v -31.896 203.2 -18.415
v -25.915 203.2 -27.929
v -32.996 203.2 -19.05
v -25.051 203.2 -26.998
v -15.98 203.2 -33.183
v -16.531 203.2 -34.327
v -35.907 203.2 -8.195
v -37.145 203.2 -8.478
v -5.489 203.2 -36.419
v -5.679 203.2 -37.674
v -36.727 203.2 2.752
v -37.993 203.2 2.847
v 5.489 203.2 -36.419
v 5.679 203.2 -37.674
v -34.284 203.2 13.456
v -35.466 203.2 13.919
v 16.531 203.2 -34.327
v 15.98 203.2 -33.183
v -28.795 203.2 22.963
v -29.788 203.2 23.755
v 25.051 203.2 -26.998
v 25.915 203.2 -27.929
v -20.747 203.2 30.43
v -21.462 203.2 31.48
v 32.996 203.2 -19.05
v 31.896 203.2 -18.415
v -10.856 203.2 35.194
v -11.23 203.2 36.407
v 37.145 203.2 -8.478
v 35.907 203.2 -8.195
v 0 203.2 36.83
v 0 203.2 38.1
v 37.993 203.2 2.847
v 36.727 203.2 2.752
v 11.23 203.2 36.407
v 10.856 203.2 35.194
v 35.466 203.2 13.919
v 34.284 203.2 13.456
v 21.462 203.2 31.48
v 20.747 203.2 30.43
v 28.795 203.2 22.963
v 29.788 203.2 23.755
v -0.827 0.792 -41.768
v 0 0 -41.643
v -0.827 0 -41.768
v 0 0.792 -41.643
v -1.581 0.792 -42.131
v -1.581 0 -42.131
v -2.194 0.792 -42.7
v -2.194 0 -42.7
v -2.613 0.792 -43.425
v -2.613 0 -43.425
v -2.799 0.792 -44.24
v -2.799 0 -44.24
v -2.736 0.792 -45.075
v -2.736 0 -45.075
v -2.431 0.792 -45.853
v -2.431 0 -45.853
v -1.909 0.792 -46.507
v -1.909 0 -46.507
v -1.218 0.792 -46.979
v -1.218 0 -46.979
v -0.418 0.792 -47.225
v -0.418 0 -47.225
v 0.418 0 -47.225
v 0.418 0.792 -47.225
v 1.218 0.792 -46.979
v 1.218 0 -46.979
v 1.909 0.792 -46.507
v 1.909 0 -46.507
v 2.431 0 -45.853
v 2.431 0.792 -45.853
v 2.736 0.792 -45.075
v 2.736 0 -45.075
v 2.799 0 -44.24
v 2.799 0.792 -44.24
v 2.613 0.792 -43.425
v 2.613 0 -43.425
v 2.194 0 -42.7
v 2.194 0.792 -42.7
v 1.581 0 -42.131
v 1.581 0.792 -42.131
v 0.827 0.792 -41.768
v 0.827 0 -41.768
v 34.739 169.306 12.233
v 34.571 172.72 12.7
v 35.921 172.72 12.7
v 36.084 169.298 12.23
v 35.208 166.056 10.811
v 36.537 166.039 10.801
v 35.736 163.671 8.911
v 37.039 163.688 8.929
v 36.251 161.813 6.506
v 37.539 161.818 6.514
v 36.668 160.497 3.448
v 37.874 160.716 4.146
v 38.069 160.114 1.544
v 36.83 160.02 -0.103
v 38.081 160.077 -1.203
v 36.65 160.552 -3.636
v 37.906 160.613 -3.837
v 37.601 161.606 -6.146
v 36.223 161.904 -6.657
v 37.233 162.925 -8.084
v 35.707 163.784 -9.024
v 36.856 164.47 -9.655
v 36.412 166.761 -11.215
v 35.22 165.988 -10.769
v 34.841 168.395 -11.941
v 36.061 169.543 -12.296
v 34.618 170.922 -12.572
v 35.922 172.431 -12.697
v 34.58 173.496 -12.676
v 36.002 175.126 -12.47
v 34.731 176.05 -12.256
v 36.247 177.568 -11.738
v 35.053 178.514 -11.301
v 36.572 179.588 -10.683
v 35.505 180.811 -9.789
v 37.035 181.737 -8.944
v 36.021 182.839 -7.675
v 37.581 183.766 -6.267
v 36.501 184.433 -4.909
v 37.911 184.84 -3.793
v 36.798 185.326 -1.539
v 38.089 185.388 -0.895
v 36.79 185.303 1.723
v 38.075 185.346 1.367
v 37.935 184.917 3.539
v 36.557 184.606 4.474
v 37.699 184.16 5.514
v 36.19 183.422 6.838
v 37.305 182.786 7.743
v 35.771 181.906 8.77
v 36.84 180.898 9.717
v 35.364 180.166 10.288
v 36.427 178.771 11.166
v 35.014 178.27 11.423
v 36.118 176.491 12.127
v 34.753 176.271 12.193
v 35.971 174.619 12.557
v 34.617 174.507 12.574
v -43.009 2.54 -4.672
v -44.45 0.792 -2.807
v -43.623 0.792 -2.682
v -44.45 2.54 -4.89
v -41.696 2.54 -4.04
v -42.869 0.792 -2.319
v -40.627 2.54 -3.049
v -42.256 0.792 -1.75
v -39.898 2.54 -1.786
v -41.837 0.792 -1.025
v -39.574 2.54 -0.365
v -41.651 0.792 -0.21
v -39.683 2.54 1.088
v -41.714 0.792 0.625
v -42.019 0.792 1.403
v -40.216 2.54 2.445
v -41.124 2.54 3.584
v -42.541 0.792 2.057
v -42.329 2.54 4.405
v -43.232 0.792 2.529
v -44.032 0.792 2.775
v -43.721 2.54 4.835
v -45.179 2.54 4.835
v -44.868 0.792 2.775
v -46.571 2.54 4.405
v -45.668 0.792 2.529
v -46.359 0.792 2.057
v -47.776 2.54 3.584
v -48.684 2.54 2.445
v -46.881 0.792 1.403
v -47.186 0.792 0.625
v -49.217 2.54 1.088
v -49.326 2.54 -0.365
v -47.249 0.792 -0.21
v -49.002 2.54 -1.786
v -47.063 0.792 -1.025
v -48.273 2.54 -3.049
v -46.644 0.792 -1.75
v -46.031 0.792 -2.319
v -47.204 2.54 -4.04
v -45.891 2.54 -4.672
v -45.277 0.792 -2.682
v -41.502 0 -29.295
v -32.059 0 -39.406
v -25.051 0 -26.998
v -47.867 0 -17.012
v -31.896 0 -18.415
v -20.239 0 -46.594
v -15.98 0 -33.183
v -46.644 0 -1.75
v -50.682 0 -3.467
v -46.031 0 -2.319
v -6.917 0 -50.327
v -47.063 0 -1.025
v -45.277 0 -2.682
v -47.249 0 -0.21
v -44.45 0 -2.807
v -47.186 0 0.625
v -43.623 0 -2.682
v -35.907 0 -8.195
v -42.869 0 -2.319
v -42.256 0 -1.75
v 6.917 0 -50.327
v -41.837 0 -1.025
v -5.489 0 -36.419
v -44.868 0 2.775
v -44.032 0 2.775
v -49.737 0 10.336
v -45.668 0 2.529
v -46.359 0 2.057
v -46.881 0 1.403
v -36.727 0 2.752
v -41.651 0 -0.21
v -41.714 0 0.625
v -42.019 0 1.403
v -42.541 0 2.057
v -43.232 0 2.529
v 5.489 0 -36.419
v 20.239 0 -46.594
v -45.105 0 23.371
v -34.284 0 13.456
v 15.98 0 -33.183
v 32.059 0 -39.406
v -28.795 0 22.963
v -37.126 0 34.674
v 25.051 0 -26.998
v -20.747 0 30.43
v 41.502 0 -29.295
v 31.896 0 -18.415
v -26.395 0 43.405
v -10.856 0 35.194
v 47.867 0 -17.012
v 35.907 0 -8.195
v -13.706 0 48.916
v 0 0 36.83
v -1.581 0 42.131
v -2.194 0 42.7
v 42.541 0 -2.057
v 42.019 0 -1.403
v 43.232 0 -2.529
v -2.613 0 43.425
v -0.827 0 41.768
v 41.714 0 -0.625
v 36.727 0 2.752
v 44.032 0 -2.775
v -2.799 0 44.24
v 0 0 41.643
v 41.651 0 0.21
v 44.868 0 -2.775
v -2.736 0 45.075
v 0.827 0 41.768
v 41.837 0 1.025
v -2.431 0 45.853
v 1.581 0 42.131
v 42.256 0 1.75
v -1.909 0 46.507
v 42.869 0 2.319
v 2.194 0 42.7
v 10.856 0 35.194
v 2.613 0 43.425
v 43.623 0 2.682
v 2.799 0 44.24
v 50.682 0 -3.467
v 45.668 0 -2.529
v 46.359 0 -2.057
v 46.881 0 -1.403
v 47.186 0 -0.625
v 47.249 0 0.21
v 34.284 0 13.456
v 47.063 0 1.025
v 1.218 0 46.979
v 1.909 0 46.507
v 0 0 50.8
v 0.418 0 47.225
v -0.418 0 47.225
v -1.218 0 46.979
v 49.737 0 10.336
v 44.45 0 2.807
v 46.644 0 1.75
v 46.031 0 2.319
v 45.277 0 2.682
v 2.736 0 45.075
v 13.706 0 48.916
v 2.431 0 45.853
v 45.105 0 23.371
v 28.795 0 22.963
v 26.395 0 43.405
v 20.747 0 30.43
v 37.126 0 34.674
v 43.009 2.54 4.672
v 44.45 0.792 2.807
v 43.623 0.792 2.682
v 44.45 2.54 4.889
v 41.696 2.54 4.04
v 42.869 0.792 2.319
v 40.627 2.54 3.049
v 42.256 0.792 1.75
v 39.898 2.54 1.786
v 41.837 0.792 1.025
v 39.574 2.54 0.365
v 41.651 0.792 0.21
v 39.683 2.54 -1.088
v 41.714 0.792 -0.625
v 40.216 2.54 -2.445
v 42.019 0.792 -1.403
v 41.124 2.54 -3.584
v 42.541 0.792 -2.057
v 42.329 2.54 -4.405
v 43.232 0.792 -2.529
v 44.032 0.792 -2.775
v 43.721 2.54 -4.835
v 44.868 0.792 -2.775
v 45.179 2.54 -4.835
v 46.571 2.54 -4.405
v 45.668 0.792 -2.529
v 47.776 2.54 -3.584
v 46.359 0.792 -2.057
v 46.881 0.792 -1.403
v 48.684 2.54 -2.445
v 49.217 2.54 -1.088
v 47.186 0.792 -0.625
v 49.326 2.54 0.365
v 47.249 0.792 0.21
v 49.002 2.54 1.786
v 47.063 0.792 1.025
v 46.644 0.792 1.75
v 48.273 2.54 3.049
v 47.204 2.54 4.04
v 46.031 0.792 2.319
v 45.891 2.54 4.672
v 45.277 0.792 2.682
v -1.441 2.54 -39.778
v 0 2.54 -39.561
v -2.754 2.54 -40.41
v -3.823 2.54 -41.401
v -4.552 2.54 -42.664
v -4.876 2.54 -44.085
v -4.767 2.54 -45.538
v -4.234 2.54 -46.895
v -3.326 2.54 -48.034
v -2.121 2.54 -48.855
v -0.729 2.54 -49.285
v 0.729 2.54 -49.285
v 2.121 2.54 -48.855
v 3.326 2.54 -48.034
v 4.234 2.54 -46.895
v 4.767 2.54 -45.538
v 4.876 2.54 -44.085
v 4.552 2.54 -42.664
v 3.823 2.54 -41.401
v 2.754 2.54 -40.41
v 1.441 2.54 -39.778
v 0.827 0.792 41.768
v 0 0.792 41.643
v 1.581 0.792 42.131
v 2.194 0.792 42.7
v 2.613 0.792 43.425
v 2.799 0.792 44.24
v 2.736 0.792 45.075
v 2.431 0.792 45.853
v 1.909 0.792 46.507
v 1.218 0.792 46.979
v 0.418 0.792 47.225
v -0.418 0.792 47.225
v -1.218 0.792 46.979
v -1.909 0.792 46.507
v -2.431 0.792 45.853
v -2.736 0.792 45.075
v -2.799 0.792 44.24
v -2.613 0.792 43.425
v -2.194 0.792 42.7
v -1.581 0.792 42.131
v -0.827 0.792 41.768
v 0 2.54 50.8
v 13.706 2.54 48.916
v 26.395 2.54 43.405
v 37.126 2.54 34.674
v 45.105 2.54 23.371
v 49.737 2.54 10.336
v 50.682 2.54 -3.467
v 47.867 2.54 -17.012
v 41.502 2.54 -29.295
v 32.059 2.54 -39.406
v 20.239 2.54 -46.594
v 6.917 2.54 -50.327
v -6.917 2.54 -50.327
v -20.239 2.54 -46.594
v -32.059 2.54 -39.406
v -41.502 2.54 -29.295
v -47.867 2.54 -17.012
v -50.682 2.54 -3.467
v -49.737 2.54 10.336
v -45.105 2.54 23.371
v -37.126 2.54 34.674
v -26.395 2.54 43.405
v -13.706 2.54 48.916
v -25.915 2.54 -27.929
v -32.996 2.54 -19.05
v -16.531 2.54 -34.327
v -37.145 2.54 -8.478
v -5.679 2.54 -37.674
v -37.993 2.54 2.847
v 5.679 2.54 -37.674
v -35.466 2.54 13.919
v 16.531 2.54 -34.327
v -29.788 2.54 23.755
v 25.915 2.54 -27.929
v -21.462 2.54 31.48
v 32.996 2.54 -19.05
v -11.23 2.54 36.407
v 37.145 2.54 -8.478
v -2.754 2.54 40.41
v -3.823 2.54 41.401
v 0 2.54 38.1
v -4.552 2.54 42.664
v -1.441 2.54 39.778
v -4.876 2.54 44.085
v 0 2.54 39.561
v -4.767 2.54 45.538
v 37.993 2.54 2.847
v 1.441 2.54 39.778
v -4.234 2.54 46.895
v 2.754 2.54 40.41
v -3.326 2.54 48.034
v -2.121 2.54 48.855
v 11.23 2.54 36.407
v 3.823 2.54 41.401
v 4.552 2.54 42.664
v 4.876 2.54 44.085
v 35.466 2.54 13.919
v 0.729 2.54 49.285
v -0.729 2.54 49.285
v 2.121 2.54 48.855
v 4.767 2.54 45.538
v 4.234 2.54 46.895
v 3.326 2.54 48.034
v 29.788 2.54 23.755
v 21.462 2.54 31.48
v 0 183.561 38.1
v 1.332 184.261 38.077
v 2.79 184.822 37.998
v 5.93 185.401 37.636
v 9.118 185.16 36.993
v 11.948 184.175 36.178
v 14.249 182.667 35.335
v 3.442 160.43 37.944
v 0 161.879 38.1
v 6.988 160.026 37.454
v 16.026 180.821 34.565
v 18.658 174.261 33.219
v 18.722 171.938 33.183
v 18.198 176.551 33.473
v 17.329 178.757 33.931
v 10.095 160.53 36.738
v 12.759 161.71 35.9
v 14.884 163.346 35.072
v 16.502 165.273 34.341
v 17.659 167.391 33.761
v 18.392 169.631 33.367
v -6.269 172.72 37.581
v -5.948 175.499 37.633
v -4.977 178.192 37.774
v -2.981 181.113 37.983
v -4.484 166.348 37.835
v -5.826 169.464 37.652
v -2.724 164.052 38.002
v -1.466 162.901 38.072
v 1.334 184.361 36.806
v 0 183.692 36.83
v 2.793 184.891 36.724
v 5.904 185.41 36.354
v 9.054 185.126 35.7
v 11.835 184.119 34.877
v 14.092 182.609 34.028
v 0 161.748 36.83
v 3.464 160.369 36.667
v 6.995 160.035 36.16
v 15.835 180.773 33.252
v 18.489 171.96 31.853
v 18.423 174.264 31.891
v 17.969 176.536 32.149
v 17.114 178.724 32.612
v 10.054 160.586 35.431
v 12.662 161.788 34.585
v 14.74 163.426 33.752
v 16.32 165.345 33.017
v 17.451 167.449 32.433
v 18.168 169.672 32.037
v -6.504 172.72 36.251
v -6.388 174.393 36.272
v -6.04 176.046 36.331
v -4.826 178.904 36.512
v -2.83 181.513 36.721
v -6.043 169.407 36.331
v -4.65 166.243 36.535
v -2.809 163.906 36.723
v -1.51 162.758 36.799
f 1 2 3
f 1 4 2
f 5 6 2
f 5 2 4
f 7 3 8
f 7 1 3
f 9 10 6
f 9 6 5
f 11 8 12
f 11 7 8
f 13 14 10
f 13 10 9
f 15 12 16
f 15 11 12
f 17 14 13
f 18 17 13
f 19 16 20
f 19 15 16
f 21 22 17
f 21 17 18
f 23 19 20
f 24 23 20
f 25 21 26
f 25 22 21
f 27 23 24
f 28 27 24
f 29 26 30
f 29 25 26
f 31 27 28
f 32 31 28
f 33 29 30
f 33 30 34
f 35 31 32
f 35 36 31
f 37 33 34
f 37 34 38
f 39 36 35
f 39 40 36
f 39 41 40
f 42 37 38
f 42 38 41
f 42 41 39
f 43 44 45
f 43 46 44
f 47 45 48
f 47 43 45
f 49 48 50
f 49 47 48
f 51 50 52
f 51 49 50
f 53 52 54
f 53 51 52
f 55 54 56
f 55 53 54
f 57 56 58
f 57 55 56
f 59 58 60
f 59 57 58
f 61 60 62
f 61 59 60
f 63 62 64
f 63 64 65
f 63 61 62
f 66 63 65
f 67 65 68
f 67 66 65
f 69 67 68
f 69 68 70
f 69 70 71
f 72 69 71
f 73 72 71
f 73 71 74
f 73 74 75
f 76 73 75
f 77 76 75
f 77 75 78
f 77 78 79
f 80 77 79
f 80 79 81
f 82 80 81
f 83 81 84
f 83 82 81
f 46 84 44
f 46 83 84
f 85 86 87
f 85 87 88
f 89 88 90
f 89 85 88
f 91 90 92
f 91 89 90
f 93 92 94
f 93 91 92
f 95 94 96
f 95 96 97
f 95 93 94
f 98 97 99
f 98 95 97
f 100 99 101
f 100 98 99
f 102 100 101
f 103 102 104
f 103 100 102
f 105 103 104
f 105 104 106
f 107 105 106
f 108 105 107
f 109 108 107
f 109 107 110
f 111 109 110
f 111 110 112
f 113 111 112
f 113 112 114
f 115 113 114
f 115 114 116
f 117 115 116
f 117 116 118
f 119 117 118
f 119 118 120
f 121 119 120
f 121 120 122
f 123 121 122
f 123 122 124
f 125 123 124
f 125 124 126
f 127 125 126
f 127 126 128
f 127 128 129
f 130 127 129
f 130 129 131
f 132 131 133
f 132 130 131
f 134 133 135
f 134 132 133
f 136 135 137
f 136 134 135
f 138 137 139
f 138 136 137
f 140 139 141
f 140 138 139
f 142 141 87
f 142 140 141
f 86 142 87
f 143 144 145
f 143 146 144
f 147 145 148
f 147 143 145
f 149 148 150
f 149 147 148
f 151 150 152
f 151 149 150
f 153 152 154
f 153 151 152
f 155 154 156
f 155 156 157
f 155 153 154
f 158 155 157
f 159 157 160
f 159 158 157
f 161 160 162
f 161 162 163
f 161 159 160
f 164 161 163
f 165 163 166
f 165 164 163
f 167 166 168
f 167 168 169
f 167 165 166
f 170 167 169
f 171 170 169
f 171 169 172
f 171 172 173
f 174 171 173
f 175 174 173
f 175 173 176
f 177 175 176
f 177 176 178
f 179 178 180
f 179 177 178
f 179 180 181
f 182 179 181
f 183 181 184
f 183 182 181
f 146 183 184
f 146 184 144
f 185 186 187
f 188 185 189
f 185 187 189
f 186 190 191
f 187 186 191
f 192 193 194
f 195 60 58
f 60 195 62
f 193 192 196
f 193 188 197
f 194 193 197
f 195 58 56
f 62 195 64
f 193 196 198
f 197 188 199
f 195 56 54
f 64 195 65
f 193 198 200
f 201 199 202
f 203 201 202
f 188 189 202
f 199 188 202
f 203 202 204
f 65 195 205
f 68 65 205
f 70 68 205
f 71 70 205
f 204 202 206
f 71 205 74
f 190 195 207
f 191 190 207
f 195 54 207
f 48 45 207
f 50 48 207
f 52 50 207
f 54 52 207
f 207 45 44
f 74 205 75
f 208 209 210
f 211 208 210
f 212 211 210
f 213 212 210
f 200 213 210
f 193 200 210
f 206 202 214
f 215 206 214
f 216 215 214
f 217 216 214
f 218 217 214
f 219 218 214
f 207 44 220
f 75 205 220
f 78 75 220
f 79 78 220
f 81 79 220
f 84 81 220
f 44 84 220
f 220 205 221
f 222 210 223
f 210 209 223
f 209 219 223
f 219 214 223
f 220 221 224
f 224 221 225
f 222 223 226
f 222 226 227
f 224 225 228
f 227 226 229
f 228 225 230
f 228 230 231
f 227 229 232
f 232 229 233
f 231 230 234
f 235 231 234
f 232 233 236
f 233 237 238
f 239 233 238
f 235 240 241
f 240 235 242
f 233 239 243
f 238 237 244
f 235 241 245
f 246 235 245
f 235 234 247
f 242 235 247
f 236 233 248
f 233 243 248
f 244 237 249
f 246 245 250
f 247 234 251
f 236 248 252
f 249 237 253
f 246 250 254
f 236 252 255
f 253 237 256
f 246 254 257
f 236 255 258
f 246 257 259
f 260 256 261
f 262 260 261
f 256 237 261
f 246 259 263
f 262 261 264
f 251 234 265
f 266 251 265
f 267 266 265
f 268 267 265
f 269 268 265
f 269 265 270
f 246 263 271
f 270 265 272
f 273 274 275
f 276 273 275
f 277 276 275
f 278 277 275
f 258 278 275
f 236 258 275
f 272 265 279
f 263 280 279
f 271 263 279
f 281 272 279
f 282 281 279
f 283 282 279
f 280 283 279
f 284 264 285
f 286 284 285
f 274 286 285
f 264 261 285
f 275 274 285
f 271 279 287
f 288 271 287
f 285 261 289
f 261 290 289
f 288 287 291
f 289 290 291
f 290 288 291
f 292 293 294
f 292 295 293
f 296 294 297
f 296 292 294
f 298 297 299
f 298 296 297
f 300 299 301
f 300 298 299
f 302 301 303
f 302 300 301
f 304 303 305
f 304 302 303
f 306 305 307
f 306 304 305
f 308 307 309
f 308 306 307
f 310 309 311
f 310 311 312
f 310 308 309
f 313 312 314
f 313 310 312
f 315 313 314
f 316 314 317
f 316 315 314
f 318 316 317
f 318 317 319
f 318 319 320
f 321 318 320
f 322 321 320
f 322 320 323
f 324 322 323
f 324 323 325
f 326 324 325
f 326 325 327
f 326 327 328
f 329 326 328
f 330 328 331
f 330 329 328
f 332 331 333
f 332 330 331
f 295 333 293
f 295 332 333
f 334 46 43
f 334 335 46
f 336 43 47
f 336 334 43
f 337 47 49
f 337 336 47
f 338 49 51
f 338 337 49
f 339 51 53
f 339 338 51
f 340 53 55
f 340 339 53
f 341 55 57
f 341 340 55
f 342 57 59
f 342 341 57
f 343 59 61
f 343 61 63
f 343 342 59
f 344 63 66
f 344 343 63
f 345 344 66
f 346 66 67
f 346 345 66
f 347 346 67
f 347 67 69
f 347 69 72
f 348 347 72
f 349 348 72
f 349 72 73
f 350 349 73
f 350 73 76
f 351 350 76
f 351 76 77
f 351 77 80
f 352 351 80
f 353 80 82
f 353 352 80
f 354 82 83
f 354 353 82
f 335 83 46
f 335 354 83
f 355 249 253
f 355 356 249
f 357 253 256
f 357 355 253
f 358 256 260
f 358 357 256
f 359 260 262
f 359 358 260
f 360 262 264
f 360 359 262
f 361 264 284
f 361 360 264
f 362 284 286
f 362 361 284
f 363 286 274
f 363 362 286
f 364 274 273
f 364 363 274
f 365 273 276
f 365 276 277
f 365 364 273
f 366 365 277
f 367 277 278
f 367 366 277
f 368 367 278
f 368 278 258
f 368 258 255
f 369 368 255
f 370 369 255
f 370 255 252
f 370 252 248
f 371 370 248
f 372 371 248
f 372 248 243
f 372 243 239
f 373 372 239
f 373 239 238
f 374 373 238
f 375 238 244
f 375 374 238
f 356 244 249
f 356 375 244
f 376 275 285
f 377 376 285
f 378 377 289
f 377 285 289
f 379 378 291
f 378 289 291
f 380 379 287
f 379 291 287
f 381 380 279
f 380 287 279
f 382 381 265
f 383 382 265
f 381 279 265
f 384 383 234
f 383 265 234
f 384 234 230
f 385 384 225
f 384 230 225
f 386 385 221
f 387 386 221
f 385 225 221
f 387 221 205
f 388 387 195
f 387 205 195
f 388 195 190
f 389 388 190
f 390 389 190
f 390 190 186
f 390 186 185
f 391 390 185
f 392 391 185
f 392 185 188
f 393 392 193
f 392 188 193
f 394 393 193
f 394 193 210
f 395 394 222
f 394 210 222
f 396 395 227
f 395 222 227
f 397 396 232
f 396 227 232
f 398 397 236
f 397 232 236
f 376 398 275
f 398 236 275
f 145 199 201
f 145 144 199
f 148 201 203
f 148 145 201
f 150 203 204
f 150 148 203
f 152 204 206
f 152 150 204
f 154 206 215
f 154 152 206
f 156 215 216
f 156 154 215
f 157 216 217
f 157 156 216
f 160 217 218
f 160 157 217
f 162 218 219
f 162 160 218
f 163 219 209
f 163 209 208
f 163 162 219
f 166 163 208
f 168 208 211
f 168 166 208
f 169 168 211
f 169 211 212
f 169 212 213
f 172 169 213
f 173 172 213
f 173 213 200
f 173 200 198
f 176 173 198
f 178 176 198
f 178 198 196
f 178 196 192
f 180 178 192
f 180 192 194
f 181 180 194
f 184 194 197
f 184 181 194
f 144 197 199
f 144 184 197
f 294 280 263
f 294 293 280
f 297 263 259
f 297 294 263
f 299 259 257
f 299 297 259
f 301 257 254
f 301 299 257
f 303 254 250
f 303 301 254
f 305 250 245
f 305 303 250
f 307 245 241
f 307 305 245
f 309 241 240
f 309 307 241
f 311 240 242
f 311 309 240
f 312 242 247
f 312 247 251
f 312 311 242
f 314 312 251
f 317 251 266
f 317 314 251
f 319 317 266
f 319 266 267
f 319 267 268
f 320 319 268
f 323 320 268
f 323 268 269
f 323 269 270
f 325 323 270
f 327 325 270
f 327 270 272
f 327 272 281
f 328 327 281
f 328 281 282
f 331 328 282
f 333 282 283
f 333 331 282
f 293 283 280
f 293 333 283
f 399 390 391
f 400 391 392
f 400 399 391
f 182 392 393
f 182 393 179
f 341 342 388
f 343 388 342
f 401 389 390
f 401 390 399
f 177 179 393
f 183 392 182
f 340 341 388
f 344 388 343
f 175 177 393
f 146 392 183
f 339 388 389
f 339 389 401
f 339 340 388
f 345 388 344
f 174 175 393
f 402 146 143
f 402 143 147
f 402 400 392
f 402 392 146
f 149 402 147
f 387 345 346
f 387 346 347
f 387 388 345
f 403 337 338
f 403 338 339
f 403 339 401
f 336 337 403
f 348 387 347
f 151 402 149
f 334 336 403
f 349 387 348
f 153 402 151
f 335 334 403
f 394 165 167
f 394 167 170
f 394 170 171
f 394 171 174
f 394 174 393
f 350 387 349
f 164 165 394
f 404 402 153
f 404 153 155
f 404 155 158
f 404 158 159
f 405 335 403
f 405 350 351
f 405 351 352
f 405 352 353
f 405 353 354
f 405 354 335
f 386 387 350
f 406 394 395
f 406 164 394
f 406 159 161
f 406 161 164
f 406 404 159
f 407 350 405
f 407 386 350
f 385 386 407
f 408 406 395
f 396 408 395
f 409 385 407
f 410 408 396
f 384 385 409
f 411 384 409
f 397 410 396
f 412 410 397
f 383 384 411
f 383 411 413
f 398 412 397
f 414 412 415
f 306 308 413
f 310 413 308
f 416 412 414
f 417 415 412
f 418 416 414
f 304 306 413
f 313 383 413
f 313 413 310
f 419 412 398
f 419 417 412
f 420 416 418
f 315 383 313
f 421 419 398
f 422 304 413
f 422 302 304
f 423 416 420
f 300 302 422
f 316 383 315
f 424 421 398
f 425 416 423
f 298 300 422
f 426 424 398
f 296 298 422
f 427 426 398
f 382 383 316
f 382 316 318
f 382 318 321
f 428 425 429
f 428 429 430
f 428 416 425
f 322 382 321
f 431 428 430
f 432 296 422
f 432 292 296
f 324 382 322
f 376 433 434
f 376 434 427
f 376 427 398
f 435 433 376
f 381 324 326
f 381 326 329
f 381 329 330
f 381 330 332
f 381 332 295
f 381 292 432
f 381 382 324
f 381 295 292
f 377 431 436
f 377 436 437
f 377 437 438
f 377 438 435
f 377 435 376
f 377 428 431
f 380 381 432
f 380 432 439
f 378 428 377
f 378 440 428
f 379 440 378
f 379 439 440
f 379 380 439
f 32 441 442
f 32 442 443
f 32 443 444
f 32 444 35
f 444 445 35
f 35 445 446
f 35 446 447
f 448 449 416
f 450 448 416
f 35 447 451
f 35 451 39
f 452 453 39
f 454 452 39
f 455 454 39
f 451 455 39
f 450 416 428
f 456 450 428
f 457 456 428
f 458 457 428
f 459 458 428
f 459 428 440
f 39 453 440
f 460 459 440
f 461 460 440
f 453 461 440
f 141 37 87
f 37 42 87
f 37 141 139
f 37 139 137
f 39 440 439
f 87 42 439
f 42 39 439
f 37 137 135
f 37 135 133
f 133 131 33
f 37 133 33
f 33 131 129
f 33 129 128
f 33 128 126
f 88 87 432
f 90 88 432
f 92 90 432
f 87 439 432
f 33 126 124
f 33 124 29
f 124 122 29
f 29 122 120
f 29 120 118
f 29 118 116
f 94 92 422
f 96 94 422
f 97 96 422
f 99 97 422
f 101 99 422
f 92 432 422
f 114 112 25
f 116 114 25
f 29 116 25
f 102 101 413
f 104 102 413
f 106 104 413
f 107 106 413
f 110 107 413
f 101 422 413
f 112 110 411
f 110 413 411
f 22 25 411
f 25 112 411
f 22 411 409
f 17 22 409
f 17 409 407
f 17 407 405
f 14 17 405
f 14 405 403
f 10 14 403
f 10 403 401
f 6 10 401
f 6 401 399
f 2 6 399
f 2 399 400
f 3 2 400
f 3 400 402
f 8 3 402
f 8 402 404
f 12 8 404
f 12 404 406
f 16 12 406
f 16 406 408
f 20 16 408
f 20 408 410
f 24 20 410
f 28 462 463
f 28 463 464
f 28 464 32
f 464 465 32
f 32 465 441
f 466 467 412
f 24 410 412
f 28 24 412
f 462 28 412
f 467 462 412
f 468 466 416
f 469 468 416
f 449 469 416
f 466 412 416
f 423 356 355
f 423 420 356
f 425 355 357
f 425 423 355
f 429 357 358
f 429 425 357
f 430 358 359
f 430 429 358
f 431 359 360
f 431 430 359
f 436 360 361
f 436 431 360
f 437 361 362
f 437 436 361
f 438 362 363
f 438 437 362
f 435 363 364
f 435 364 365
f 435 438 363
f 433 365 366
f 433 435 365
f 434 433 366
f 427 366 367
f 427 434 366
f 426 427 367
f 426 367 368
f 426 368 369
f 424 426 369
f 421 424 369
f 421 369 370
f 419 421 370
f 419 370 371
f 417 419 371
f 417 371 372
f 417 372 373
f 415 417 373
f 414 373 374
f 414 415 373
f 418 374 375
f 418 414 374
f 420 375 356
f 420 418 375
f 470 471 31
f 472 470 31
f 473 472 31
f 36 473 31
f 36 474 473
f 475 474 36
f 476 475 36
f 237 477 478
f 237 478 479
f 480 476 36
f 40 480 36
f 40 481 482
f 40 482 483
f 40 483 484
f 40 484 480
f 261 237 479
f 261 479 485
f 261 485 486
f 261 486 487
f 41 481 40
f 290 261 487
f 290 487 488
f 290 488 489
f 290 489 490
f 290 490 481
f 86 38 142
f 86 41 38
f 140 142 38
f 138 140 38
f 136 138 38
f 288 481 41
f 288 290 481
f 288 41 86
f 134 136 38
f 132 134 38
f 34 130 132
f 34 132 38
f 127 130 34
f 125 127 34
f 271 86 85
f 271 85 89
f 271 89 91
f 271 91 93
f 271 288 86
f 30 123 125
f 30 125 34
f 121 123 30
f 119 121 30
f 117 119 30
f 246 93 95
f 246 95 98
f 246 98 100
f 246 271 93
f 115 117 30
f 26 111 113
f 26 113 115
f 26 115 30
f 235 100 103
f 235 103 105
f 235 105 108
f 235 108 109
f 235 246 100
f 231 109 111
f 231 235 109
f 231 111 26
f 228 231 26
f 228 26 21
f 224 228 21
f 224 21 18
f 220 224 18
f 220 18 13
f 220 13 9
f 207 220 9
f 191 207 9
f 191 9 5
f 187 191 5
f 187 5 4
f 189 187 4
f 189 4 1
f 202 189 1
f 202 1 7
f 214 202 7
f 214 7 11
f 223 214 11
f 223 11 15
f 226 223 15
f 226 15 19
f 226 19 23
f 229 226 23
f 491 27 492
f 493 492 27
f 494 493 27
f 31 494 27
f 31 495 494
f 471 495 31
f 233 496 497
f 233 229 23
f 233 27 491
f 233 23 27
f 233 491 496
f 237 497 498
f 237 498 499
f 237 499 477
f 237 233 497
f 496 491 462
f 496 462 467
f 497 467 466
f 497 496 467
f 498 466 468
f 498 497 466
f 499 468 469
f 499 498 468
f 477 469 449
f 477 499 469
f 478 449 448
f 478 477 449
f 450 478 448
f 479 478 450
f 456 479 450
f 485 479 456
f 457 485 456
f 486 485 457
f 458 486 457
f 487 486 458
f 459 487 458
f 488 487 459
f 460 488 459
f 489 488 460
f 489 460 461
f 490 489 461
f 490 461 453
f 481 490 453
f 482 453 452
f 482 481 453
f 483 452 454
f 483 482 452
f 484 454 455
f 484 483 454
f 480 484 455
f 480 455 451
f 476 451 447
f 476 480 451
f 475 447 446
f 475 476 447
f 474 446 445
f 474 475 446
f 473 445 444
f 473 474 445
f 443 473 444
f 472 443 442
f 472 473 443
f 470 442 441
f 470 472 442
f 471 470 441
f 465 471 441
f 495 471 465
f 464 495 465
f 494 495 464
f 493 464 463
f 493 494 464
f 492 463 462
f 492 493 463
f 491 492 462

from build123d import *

# Parameters (mm, degrees)
SKETCH1_R                                  = 38.1
SKETCH1_R_2                                = 36.83
BOSS_EXTRUDE1_DEPTH                        = 203.2
SKETCH2_R                                  = 12.7
CUT_EXTRUDE1_DEPTH                         = 211.222406037
CIRPATTERN2_COUNT                          = 2
CIRPATTERN2_ANGLE                          = 80
SKETCH5_R                                  = 50.8
SKETCH5_R_2                                = 38.1
BOSS_EXTRUDE2_DEPTH                        = 2.54
CSK_FOR_10_FLAT_HEAD_MACHINE_SCREW_2_COUNT = 2
CSK_FOR_10_FLAT_HEAD_MACHINE_SCREW_2_PITCH = 62.861792847
CIRPATTERN3_COUNT                          = 2


with BuildPart() as part:
    # Sketch1 → Boss-Extrude1 (new body)
    with BuildSketch(Plane(origin=(0, 0, 0), x_dir=(1, 0, 0), z_dir=(0, 1, 0))):
        with Locations(Location((0, 0, 0), (0, 0, 270))):
            Circle(SKETCH1_R)
        with Locations(Location((0, 0, 0), (0, 0, 270))):
            Circle(SKETCH1_R_2, mode=Mode.SUBTRACT)
    extrude(amount=BOSS_EXTRUDE1_DEPTH)

    # Sketch2 → Cut-Extrude1 (cut, through all)
    with BuildSketch(Plane(origin=(0, 0, 0), x_dir=(0, 0, -1), z_dir=(1, 0, 0))):
        with Locations(Location((0, 172.72, 0), (0, 0, 180))):
            Circle(SKETCH2_R)
    cut_extrude1 = extrude(amount=CUT_EXTRUDE1_DEPTH, mode=Mode.SUBTRACT)

    # CirPattern2: Cut-Extrude1 ×2 about axis
    cirpattern2_axis = Axis((0, 203.2, 0), (0, -1, 0))
    for i in range(1, CIRPATTERN2_COUNT):
        add(cut_extrude1.rotate(cirpattern2_axis, i * CIRPATTERN2_ANGLE / (CIRPATTERN2_COUNT - 1)), mode=Mode.SUBTRACT)

    # Sketch5 → Boss-Extrude2 (add)
    with BuildSketch(Plane(origin=(0, 0, 0), x_dir=(1, 0, 0), z_dir=(0, 1, 0))):
        with Locations(Location((0, 0, 0), (0, 0, 270))):
            Circle(SKETCH5_R)
        with Locations(Location((0, 0, 0), (0, 0, 270))):
            Circle(SKETCH5_R_2, mode=Mode.SUBTRACT)
    extrude(amount=BOSS_EXTRUDE2_DEPTH)

    # Sketch7 → CSK for #10 Flat Head Machine Screw (100)1 (revolve, cut)
    with BuildSketch(Plane(origin=(0, 2.54, -44.45), x_dir=(0, 0, 1), z_dir=(1, 0, 0))):
        Polygon((0, 0), (0, 2.54), (2.8067, 2.54), (2.8067, 1.747676712), (4.8895, 0), align=None)
    csk_for_10_flat_head_machine_screw_100 = revolve(axis=Axis((0, 8.89, -44.45), (0, -1, 0)), mode=Mode.SUBTRACT)

    # CSK for _10 Flat Head Machine Screw  2: CSK for #10 Flat Head Machine Screw (100)1 ×2
    with Locations(*[Vector(0.7071067811865476, 0, 0.7071067811865476) * (i * CSK_FOR_10_FLAT_HEAD_MACHINE_SCREW_2_PITCH) for i in range(1, CSK_FOR_10_FLAT_HEAD_MACHINE_SCREW_2_COUNT)]):
        add(csk_for_10_flat_head_machine_screw_100, mode=Mode.SUBTRACT)

    # CirPattern3: CSK for #10 Flat Head Machine Screw (100)1 ×2 about axis
    cirpattern3_axis = Axis((0, 0, 0), (0, 1, 0))
    for i in range(1, CIRPATTERN3_COUNT):
        add(csk_for_10_flat_head_machine_screw_100.rotate(cirpattern3_axis, i * 360 / CIRPATTERN3_COUNT), mode=Mode.SUBTRACT)

    # CirPattern3 copy 1 sketch → CirPattern3 copy 1 (revolve, cut)
    with BuildSketch(Plane(origin=(-44.45, 2.54, 0), x_dir=(0, 0, -1), z_dir=(-1, 0, 0))):
        Polygon((0, 0), (0, 2.54), (2.8067, 2.54), (2.8067, 1.747676712), (4.8895, 0), align=None)
    revolve(axis=Axis((-44.45, 8.89, 0), (0, -1, 0)), mode=Mode.SUBTRACT)


solid = part.part
